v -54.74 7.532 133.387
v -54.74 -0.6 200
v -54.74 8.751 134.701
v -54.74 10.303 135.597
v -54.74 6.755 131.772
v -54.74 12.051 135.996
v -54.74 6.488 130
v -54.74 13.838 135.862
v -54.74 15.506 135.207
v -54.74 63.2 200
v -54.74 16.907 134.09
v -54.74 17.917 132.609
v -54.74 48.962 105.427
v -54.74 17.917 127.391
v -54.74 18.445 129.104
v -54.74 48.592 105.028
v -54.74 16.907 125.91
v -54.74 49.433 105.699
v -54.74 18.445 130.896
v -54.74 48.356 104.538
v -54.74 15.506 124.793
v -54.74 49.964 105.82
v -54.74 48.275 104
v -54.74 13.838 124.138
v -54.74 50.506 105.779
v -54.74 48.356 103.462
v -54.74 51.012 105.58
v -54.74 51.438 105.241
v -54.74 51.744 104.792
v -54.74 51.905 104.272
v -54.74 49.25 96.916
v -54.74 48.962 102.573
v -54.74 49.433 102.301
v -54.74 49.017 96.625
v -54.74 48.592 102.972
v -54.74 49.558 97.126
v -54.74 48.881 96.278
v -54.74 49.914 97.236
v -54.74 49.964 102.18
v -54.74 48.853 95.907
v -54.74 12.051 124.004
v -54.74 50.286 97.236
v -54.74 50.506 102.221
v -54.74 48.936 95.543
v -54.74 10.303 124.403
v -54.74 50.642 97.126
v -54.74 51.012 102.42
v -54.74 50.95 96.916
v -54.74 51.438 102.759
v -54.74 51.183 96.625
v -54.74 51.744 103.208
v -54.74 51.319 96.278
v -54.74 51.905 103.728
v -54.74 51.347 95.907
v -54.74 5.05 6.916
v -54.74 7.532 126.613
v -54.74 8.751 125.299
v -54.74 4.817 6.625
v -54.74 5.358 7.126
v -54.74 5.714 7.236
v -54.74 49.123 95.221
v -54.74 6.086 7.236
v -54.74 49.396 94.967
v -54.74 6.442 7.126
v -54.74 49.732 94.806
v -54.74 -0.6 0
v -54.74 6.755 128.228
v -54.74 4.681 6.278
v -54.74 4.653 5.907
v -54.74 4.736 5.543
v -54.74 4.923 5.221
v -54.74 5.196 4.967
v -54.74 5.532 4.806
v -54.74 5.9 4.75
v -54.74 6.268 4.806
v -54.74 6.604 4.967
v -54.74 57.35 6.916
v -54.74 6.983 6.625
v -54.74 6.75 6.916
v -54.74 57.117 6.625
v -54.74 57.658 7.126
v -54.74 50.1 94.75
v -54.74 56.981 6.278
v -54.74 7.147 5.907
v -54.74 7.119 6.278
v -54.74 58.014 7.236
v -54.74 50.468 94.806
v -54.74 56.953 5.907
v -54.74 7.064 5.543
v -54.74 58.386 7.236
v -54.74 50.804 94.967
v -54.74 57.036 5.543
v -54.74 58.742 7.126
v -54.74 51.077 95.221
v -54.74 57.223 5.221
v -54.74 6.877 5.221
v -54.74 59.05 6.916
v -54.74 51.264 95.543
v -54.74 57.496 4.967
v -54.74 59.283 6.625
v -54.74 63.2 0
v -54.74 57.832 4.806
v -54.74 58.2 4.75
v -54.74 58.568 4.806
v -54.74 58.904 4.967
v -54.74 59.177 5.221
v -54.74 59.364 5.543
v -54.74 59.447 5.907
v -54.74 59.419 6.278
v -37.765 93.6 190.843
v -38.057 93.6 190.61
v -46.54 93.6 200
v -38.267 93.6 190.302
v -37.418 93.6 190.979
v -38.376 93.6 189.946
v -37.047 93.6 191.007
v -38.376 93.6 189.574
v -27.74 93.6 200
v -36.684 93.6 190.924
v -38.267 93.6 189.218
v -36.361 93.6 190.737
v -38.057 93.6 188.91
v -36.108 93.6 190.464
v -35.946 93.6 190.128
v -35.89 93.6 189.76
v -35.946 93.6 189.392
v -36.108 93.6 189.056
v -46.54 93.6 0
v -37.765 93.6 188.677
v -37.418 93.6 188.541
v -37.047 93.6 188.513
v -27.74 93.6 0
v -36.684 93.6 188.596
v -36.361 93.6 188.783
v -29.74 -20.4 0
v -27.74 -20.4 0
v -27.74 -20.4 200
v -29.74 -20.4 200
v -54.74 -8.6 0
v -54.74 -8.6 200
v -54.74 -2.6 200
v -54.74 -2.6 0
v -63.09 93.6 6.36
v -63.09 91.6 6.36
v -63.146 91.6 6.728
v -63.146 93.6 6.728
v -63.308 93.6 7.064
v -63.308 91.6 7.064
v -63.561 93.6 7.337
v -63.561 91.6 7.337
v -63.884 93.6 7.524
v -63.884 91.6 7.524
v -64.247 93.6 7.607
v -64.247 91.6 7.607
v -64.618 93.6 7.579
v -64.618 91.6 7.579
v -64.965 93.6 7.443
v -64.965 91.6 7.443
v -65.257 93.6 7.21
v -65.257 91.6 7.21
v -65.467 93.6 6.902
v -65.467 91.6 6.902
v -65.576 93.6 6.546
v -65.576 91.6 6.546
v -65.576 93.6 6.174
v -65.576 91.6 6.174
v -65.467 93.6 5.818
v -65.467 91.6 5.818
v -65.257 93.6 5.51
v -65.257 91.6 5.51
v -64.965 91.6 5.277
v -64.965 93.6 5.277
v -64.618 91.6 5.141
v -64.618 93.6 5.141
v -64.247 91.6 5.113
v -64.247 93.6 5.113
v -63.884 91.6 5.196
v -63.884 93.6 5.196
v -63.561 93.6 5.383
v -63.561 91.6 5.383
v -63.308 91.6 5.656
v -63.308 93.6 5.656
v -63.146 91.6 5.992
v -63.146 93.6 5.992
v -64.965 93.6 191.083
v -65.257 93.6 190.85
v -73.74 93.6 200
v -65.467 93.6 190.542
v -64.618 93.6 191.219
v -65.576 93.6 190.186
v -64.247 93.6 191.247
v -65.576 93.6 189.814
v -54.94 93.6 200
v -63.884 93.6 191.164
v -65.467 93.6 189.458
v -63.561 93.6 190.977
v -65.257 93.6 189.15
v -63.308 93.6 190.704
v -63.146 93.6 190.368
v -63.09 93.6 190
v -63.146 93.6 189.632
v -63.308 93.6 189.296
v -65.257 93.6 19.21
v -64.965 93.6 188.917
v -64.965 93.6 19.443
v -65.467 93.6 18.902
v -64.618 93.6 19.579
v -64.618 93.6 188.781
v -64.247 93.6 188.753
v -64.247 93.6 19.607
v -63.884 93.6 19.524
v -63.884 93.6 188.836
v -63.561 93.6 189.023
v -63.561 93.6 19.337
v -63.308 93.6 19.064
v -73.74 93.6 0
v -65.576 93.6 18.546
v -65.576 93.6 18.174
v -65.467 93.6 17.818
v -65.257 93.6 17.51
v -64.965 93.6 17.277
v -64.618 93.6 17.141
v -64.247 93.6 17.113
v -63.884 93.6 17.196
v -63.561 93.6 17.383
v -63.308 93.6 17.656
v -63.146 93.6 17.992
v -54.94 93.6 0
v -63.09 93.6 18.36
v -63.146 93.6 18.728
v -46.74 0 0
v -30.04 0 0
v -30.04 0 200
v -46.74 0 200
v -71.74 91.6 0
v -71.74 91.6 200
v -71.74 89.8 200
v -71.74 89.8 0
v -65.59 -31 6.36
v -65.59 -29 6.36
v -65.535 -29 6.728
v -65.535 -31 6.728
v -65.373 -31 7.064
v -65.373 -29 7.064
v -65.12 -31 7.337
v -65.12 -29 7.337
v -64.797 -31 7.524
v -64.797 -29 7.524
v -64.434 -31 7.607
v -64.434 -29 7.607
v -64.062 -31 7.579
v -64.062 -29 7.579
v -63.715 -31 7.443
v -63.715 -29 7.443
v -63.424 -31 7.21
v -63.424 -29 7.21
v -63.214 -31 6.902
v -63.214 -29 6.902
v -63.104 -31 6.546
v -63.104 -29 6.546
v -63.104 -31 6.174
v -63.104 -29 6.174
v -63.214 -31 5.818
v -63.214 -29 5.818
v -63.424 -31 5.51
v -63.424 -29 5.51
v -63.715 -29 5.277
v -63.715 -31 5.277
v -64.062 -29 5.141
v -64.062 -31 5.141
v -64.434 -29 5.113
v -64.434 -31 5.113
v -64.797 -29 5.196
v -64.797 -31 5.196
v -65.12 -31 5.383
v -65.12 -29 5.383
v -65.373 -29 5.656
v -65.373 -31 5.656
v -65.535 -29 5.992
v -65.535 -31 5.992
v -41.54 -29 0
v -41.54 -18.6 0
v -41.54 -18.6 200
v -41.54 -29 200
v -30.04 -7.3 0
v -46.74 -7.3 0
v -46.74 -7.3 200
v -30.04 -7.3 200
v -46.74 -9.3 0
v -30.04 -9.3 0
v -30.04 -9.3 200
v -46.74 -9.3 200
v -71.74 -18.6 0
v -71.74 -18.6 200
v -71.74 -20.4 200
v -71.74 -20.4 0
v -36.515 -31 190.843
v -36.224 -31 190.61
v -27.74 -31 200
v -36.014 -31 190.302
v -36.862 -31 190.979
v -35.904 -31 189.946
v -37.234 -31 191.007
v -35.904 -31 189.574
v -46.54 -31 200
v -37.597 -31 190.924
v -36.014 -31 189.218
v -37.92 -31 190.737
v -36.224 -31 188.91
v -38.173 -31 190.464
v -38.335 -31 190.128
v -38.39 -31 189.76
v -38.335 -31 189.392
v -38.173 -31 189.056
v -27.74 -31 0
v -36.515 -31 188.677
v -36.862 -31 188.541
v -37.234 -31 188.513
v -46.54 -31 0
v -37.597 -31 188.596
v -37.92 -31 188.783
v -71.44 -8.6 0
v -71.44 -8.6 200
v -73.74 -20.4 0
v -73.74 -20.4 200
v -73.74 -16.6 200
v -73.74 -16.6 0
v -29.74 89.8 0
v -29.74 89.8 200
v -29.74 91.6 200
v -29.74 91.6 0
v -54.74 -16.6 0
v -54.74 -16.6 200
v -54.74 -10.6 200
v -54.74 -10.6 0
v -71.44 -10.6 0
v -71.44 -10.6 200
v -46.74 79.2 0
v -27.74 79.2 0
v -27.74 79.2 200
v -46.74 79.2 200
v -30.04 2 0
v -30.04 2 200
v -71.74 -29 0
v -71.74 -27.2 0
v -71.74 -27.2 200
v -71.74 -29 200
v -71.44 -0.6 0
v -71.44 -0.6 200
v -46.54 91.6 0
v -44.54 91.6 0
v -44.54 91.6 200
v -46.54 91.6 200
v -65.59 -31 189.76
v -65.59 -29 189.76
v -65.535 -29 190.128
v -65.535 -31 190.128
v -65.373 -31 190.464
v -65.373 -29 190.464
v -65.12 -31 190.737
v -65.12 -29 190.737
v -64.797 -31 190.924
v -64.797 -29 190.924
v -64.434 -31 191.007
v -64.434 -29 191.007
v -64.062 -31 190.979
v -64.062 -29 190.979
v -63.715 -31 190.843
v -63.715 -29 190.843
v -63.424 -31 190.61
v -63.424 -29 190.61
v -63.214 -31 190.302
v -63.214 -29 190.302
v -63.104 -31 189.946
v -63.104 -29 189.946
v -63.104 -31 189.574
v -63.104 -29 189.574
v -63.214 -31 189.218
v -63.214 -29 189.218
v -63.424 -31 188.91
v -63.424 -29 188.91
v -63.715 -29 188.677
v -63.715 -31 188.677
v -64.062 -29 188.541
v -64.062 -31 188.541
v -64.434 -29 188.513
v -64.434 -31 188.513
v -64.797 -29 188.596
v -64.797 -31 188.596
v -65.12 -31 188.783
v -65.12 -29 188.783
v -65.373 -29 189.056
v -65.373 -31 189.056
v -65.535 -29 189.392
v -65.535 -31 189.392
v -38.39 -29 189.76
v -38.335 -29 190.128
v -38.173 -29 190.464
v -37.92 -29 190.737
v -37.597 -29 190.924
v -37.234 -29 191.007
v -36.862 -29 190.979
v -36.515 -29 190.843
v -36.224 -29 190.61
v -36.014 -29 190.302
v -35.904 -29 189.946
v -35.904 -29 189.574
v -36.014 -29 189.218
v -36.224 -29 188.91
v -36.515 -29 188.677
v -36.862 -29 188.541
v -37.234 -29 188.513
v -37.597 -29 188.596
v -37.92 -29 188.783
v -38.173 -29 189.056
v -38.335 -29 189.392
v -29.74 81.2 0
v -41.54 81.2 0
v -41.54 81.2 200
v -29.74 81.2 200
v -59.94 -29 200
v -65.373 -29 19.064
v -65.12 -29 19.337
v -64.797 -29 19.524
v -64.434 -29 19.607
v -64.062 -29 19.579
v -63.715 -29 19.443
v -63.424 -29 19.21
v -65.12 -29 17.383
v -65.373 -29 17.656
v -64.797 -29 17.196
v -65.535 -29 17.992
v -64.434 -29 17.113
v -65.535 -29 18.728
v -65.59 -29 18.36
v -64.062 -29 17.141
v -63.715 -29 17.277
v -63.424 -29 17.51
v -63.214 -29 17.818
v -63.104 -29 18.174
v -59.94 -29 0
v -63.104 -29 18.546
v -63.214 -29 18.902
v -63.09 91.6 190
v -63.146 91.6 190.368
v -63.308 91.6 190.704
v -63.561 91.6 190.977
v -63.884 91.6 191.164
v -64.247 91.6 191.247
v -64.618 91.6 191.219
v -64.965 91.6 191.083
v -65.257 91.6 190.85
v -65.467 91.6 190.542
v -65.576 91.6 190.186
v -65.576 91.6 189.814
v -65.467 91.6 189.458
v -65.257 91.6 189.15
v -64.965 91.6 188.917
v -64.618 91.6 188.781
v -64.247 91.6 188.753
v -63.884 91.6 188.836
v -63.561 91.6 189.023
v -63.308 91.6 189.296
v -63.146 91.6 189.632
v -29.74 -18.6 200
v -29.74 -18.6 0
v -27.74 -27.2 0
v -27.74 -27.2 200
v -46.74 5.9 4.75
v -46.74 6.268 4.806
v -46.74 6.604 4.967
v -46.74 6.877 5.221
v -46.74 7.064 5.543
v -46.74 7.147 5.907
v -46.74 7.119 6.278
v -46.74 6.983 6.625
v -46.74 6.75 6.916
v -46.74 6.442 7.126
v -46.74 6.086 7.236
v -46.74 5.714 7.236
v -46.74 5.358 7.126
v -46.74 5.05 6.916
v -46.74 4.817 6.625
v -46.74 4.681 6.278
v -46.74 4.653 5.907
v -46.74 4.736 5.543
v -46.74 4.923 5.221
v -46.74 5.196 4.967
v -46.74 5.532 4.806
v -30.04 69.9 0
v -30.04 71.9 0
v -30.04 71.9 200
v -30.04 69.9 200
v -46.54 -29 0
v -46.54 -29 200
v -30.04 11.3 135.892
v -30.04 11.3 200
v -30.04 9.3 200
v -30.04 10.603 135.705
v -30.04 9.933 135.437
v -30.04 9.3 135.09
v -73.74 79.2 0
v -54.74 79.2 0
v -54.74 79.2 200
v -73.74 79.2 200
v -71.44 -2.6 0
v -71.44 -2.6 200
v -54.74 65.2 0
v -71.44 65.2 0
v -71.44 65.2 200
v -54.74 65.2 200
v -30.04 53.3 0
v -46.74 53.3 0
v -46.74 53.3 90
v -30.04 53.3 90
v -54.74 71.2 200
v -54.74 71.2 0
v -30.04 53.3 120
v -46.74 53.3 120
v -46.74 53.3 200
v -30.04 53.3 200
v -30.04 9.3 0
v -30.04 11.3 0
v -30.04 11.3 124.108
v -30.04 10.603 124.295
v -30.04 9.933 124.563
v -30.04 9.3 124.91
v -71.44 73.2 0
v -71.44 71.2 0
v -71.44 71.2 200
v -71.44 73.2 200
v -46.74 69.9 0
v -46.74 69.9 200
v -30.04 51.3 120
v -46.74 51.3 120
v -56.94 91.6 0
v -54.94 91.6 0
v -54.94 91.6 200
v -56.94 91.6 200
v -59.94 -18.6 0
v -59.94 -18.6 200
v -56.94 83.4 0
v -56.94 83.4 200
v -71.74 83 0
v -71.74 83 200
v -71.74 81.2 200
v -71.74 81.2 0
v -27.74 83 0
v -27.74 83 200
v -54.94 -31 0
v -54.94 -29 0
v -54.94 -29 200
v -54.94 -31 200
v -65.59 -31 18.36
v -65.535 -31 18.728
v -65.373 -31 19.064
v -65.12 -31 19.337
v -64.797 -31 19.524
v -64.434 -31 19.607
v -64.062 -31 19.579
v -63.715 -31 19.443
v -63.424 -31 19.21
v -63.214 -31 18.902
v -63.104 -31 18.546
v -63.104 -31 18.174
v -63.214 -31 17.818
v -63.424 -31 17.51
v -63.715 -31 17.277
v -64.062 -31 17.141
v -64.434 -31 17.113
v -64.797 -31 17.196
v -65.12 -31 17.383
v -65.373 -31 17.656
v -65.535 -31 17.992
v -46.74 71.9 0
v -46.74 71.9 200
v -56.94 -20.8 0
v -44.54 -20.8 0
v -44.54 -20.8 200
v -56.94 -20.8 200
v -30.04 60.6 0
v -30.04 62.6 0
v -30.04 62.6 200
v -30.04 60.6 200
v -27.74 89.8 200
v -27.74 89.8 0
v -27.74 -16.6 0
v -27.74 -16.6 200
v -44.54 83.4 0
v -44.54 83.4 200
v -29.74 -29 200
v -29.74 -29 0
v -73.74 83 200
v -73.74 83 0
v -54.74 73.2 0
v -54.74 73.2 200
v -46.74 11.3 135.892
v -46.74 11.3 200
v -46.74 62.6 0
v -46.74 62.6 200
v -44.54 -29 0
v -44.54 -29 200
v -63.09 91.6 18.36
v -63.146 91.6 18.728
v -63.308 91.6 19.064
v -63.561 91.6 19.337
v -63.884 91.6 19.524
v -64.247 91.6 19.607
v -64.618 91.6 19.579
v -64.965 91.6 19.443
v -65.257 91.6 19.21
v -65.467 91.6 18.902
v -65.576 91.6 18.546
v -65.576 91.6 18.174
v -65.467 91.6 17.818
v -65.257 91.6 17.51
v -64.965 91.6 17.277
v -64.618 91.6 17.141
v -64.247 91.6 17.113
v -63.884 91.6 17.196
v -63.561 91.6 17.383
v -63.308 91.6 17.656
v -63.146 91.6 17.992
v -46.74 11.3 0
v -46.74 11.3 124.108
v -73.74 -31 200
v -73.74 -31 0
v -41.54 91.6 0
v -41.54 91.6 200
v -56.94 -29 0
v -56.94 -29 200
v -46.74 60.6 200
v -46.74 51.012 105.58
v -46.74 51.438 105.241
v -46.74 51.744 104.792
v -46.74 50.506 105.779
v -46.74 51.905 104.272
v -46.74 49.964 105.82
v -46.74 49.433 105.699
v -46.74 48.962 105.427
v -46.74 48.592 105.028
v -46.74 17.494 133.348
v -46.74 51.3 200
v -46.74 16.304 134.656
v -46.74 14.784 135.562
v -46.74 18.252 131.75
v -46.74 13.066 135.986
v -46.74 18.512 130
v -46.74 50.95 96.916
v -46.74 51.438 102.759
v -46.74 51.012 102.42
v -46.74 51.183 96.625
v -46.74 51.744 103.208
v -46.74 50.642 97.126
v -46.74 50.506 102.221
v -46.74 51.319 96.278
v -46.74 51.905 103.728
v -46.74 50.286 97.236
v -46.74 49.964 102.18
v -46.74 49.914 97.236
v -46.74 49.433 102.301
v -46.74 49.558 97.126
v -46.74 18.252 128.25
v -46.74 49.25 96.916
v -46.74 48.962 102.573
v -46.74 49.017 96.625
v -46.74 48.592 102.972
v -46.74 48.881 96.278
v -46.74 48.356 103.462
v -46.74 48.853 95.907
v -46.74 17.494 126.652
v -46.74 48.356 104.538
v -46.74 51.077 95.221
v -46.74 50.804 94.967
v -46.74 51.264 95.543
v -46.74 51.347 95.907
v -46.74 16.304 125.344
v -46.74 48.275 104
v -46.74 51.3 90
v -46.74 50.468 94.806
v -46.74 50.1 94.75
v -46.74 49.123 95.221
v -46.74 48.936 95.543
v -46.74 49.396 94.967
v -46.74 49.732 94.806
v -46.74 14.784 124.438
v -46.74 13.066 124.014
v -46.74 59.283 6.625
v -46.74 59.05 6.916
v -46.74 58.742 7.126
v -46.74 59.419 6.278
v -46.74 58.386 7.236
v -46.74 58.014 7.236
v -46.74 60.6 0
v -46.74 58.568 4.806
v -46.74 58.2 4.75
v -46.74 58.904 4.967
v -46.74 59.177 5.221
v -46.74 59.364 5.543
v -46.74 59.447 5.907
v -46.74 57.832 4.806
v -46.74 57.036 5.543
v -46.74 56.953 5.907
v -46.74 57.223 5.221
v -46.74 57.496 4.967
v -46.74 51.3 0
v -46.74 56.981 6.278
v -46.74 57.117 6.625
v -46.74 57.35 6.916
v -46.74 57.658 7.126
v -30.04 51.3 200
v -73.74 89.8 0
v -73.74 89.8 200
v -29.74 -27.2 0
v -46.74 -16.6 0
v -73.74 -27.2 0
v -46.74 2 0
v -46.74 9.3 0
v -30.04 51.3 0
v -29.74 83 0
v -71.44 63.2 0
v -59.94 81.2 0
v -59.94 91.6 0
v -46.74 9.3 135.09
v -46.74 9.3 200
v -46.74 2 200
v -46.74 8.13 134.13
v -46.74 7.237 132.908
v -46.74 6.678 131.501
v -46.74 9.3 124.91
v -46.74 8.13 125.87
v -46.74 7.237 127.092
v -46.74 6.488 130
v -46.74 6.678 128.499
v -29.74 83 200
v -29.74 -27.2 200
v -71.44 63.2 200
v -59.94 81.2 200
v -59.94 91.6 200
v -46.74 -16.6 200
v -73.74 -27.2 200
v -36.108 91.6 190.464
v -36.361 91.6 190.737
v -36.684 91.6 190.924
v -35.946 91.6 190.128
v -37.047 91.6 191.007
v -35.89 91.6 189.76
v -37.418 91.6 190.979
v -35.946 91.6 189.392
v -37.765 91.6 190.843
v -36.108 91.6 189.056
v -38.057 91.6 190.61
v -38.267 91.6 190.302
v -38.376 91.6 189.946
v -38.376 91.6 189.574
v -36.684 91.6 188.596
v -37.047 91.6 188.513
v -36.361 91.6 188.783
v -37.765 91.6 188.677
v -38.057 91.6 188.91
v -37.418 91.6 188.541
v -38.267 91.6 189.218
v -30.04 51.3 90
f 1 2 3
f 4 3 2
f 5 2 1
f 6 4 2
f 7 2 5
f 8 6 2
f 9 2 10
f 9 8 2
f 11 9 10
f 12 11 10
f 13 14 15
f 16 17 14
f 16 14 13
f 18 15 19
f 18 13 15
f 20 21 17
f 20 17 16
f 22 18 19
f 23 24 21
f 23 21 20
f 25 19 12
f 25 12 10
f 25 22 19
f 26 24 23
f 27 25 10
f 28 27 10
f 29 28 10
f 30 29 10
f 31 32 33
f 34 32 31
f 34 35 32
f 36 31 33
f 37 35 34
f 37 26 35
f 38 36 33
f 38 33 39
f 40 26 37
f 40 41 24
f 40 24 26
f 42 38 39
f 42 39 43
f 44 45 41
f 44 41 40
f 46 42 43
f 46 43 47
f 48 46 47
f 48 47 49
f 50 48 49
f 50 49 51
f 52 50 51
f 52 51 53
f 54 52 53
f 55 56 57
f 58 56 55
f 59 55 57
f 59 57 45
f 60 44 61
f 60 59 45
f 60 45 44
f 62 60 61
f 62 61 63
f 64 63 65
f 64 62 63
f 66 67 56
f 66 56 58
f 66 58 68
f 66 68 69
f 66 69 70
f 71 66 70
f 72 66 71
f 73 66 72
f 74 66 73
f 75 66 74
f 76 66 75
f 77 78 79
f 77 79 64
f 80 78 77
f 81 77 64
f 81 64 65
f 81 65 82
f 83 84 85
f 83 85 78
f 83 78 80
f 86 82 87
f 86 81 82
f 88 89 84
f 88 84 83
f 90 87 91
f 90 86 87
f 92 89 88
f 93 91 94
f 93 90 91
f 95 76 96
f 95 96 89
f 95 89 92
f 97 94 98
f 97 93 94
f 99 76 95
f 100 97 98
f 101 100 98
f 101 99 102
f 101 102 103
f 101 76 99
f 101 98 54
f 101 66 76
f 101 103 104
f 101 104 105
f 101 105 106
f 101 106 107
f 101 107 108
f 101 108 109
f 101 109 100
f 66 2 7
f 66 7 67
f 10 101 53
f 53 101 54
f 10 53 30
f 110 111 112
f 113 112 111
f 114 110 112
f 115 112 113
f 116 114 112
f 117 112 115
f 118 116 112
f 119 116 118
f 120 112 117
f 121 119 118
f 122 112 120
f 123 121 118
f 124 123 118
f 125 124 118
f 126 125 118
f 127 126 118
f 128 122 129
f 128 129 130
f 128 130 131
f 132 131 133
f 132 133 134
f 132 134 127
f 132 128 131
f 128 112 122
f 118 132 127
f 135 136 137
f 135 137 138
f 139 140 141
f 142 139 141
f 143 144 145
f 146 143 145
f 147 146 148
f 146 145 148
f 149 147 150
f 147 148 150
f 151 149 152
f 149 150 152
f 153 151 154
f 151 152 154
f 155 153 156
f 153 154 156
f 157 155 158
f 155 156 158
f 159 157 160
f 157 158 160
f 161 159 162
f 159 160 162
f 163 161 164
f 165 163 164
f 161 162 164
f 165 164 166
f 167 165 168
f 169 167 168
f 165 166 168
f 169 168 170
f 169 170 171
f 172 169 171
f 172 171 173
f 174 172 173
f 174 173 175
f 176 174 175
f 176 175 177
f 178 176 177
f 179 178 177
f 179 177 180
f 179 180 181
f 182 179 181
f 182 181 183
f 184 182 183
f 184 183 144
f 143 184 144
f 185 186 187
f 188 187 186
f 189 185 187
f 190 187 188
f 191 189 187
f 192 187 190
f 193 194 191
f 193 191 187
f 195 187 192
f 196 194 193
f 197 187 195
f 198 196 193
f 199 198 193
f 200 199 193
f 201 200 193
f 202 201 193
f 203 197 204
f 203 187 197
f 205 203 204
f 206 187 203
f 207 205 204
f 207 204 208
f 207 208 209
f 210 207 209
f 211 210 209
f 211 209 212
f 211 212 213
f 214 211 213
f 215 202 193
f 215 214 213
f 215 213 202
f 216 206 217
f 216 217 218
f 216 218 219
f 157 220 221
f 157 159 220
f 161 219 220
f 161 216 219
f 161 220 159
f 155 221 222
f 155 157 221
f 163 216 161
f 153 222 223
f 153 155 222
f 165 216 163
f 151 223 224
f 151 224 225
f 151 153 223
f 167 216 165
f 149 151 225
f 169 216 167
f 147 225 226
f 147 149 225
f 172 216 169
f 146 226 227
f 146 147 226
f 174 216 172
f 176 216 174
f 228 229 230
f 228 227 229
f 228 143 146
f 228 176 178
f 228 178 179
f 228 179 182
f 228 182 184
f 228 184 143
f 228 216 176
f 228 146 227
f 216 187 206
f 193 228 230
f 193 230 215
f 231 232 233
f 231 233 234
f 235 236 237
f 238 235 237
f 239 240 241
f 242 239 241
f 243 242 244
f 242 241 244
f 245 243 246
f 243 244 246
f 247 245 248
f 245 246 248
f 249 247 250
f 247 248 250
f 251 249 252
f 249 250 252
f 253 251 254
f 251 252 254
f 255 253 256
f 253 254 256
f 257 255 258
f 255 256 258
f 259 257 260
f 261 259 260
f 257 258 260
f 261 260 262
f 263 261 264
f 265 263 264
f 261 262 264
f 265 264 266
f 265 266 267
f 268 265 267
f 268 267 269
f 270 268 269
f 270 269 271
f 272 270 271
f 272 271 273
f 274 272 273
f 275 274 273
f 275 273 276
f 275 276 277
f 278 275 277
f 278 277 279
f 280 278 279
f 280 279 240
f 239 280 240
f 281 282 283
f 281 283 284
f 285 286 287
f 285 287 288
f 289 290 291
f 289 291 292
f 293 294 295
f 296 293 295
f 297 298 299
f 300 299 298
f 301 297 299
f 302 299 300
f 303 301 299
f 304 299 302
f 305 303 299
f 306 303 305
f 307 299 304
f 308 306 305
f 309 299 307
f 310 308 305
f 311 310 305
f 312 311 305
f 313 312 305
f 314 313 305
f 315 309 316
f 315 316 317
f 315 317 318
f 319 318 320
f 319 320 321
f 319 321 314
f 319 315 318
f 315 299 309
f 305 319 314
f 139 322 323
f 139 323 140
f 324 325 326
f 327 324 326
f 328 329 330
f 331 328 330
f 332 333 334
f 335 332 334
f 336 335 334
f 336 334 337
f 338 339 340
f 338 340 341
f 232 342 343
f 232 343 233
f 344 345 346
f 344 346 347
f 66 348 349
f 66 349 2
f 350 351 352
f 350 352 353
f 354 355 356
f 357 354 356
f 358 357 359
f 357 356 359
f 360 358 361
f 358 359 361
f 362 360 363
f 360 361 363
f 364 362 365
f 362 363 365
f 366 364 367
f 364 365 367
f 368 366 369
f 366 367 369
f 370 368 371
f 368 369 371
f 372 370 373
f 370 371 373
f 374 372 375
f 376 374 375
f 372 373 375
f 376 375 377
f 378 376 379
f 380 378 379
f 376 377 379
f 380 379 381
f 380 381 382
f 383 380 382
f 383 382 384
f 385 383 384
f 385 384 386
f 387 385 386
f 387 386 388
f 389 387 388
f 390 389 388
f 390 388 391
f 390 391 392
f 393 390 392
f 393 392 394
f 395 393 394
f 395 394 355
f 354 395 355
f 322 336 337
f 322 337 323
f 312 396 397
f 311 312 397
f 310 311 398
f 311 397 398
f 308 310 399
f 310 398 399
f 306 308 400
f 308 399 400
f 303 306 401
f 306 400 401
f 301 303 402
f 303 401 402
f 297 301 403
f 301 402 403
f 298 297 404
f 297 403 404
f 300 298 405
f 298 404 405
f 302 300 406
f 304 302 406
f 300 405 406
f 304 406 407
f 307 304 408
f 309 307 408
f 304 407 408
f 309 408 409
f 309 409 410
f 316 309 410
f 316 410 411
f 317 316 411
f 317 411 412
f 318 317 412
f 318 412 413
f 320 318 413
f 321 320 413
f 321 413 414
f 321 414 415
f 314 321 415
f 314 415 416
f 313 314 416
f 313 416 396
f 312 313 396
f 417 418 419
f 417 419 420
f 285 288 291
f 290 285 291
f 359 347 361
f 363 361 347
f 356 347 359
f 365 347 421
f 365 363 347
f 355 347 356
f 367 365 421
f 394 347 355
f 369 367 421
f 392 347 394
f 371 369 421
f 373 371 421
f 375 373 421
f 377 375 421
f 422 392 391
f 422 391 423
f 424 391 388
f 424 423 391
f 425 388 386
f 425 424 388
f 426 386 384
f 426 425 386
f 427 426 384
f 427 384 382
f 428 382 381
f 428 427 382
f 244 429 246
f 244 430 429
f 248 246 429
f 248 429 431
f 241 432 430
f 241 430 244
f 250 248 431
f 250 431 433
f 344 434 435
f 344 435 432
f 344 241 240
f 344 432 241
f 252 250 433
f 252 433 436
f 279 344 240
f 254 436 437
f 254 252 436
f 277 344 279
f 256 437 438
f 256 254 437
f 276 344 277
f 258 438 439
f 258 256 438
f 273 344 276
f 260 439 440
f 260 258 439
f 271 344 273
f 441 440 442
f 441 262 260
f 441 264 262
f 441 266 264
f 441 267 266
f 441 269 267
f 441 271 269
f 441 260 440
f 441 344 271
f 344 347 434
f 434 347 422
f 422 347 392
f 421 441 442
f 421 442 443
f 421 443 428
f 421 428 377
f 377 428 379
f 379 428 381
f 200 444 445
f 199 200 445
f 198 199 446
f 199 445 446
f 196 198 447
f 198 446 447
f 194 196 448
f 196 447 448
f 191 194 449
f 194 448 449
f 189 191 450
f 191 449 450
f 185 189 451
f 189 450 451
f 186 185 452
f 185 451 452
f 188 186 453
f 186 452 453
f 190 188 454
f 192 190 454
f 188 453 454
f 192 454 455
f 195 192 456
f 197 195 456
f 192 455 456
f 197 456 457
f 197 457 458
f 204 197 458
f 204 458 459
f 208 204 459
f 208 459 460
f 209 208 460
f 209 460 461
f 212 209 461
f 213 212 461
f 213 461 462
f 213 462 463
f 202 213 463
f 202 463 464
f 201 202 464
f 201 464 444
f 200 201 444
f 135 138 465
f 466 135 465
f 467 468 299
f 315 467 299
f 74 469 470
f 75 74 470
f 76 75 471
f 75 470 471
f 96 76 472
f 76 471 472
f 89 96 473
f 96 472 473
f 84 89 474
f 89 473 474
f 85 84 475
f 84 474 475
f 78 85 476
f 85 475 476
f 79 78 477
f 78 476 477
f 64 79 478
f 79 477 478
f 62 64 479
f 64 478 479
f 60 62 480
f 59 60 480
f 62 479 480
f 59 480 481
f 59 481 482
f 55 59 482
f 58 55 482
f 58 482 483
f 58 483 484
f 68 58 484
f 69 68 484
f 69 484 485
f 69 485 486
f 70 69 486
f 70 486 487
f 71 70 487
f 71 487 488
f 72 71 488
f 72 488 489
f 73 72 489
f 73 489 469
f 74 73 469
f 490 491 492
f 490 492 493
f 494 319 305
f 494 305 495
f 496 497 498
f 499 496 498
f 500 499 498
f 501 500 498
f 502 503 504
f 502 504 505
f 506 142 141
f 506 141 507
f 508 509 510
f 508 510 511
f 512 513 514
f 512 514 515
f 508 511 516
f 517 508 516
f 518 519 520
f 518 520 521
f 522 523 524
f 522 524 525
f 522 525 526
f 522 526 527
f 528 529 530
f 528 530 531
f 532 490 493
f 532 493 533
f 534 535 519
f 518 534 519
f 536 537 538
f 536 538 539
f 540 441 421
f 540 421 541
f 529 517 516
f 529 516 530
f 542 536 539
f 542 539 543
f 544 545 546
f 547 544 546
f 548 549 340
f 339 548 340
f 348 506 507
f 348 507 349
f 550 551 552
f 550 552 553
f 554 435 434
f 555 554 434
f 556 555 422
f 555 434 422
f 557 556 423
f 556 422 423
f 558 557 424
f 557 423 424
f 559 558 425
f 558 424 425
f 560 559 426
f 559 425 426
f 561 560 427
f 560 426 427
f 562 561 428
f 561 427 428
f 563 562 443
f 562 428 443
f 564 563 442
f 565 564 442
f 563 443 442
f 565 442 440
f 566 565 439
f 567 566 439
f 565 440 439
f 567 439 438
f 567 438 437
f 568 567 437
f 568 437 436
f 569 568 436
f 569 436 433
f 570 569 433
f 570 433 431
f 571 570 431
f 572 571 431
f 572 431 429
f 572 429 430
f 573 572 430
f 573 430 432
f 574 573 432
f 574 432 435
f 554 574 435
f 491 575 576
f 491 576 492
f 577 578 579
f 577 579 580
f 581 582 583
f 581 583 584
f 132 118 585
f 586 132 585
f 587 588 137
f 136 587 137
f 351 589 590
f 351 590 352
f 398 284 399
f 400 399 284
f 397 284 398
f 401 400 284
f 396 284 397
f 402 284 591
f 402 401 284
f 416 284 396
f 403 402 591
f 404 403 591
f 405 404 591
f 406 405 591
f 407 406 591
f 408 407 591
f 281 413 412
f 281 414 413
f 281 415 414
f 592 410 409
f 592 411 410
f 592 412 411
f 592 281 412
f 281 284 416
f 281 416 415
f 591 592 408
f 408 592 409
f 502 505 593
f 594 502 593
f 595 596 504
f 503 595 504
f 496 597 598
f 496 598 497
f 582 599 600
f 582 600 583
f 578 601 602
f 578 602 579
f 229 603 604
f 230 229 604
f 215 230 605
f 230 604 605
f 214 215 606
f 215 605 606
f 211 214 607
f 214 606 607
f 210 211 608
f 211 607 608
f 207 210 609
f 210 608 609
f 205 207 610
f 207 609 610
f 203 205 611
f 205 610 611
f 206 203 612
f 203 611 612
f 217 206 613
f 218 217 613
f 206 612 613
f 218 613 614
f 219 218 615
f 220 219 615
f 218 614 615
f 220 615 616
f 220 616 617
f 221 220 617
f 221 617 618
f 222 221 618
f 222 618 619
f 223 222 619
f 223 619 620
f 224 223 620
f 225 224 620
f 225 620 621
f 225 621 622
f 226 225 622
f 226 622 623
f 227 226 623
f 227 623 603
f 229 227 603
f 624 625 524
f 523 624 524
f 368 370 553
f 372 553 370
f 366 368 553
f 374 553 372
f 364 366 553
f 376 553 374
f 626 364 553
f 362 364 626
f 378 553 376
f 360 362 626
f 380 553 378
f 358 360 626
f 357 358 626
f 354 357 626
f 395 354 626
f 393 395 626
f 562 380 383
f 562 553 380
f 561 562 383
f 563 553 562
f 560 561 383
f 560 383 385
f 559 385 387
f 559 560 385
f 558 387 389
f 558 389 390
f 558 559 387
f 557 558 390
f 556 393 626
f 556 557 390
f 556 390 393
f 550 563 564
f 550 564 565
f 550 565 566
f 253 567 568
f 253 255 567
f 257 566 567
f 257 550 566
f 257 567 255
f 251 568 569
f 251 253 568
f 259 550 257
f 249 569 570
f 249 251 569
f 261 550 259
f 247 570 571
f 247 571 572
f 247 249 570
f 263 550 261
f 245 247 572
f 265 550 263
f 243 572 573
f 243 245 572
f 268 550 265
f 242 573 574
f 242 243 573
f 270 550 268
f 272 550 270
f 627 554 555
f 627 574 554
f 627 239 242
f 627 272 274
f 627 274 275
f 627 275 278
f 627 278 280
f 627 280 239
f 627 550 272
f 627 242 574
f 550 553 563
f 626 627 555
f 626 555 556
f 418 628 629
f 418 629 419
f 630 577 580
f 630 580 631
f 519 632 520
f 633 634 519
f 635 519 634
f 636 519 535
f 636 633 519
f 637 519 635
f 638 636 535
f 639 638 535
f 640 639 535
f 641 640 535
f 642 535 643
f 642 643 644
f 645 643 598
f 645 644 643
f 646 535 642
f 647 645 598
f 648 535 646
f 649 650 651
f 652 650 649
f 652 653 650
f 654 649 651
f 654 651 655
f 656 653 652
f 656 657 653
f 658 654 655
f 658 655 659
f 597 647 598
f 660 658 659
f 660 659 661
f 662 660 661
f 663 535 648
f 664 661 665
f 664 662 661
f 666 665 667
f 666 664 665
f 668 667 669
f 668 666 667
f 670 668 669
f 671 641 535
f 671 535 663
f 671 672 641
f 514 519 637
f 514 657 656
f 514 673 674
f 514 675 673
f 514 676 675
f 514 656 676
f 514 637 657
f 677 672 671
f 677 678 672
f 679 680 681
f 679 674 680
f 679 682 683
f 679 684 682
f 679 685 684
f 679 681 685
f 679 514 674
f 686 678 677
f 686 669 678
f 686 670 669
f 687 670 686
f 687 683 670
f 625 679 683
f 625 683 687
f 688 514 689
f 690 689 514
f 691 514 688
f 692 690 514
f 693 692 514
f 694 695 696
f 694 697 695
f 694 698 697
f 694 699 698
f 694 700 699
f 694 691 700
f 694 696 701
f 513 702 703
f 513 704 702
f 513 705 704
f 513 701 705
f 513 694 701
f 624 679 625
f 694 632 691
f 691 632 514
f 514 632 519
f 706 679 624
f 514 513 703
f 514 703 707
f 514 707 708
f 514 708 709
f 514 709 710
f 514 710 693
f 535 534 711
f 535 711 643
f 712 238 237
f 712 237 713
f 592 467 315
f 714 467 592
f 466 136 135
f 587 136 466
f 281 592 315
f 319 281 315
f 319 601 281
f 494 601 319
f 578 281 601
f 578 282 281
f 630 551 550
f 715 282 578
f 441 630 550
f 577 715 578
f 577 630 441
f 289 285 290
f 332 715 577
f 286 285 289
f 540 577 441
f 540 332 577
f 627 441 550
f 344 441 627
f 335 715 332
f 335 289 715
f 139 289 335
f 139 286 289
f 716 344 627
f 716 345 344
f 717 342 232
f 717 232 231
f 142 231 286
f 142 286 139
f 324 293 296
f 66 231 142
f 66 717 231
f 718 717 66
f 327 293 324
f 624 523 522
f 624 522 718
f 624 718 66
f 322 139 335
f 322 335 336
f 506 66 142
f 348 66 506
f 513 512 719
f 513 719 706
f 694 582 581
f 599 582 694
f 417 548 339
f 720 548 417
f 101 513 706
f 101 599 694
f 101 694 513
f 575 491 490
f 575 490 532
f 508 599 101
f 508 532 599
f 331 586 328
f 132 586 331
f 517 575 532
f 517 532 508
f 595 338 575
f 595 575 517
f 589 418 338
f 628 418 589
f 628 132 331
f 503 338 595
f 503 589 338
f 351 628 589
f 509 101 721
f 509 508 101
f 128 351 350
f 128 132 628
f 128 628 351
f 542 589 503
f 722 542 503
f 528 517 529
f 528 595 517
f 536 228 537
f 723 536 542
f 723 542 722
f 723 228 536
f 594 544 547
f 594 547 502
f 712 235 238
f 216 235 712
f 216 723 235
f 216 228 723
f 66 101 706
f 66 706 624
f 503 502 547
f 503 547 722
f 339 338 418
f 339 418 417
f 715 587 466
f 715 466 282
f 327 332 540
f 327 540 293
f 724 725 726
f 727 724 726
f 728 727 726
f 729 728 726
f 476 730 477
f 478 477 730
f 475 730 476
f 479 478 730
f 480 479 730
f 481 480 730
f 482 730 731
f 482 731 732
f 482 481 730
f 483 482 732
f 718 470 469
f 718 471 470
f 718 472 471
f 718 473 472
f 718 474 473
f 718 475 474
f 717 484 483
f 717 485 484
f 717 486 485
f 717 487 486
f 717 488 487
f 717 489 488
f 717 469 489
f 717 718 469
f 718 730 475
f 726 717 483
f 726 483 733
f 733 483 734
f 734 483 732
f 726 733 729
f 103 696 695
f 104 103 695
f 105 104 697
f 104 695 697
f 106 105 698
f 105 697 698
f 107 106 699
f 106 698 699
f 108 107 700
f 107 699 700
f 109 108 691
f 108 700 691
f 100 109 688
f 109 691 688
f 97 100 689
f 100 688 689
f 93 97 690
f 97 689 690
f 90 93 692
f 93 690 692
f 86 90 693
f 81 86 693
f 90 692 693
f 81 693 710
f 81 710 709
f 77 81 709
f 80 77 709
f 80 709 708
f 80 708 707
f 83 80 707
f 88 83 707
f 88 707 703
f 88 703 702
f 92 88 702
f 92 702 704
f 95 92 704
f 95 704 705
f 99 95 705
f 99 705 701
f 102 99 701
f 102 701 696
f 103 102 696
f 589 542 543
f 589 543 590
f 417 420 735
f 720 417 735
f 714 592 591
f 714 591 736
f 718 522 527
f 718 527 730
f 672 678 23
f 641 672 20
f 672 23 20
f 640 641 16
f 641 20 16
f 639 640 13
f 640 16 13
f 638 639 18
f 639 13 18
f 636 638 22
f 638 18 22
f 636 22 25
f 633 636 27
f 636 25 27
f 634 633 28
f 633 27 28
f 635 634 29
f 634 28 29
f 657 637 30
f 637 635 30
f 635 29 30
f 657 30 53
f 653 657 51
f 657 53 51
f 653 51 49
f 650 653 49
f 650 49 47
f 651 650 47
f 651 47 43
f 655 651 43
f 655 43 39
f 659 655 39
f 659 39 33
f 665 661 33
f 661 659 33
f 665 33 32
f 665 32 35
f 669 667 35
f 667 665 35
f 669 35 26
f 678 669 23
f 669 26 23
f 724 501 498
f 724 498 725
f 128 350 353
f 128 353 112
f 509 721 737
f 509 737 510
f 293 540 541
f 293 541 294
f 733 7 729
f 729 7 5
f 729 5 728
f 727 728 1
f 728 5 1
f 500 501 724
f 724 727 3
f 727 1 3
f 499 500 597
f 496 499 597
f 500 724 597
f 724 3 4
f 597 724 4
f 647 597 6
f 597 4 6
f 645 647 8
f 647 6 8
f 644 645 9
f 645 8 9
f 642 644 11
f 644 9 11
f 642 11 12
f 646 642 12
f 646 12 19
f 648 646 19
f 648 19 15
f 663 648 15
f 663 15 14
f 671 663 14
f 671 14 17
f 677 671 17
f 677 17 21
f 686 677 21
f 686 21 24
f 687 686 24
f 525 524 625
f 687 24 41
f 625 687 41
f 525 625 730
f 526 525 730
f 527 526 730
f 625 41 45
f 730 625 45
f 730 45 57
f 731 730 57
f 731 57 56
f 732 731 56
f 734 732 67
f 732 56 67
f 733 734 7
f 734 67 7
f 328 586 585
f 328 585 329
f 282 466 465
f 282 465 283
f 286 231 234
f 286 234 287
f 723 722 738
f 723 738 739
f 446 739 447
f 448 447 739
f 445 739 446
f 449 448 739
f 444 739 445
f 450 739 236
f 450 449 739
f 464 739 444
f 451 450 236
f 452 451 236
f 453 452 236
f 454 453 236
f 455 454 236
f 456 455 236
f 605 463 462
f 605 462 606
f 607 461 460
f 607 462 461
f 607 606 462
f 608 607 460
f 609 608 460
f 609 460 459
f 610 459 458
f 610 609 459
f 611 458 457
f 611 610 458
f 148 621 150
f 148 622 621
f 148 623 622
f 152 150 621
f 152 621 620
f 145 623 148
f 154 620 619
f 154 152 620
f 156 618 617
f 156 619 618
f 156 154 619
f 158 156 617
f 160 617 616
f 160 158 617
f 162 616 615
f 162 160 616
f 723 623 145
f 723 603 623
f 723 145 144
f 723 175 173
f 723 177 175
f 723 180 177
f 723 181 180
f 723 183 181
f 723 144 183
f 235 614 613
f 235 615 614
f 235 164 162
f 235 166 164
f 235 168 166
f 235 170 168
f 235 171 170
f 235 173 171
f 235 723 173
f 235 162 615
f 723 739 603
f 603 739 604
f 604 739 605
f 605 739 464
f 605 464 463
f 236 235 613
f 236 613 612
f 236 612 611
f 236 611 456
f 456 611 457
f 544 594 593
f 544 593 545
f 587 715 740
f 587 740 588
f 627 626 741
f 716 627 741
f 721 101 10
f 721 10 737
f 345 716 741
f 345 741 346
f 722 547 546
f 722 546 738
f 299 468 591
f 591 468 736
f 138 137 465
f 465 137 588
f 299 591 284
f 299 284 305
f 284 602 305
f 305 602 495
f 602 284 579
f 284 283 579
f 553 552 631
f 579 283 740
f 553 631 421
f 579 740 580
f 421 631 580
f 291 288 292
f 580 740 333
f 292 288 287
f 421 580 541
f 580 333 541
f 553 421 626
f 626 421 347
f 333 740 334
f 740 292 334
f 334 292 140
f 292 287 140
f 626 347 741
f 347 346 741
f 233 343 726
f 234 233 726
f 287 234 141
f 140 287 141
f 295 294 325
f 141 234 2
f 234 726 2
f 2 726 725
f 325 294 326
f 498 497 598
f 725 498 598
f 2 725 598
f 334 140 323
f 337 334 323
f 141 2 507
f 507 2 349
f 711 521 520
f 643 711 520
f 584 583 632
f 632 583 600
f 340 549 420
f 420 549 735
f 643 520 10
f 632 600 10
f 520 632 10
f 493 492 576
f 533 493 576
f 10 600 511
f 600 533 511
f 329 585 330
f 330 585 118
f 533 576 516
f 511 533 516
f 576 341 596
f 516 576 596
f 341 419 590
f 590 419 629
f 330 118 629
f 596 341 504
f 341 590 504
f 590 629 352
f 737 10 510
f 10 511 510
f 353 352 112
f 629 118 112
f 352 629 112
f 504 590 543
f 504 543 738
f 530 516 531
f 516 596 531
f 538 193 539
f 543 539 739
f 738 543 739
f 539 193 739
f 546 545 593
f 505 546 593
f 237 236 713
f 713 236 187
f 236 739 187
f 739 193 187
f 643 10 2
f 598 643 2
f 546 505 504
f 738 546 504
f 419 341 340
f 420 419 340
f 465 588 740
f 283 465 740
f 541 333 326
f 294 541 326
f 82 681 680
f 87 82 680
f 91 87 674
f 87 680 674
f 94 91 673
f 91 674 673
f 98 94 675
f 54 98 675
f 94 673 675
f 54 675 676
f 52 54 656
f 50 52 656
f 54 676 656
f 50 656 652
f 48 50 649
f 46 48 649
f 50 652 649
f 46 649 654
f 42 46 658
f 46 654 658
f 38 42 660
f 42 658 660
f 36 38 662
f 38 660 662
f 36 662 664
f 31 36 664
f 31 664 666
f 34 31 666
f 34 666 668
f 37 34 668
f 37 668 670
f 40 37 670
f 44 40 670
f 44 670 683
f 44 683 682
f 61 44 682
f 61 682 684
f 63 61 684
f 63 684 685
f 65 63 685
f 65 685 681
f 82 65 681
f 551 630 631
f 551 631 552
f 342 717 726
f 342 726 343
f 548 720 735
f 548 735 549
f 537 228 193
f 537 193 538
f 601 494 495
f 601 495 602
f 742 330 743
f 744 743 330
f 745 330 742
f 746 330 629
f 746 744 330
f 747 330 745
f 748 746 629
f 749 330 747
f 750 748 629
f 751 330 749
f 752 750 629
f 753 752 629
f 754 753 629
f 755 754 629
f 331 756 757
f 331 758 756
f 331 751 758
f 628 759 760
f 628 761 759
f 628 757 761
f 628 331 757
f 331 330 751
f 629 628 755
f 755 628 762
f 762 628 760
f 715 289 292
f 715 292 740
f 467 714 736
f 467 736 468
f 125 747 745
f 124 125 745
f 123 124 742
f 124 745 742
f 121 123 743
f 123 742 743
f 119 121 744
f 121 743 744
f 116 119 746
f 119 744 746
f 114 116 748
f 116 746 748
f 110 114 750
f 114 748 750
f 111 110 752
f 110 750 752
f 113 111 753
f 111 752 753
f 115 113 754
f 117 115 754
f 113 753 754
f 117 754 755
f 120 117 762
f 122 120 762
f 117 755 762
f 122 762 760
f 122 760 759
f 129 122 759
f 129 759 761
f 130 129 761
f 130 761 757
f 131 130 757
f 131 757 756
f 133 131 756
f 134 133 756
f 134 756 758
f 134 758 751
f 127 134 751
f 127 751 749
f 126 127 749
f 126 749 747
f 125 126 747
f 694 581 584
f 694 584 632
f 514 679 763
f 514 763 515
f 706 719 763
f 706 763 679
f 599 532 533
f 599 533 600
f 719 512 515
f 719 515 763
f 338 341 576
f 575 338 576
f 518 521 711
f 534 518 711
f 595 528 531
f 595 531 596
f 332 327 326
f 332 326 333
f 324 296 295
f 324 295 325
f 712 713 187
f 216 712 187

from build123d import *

# Parameters (mm, degrees)
RESSALTO_EXTRUS_O1_DEPTH                     = 200
CORTE_EXTRUS_O3_REACH                        = 224.463
ESBO_O4_R                                    = 1.825
CORTE_EXTRUS_O5_REACH                        = 224.463
ESBO_O6_R                                    = 6.0125
BROCA_DE_ROSQUEAR_PARA_TARRAXA_DE_M3X0_5_D   = 2.5
BROCA_DE_ROSQUEAR_PARA_TARRAXA_DE_M3_2_D     = 2.5
BROCA_DE_ROSQUEAR_PARA_TARRAXA_DE_M3_2_DEPTH = 8
BROCA_DE_ROSQUEAR_PARA_TARRAXA_DE_M3_3_D     = 2.5
BROCA_DE_ROSQUEAR_PARA_TARRAXA_DE_M3_3_DEPTH = 2
BROCA_DE_ROSQUEAR_PARA_TARRAXA_DE_M3_4_D     = 2.5
BROCA_DE_ROSQUEAR_PARA_TARRAXA_DE_M3_4_DEPTH = 2
BROCA_DE_ROSQUEAR_PARA_TARRAXA_DE_M3_5_D     = 2.5
BROCA_DE_ROSQUEAR_PARA_TARRAXA_DE_M3_5_DEPTH = 2
CORTE_EXTRUS_O6_START                        = -16.7
ESBO_O26_W                                   = 30
ESBO_O26_H                                   = 2
CORTE_EXTRUS_O6_DEPTH                        = 16.7
BROCA_DE_ROSQUEAR_PARA_TARRAXA_DE_M3_6_D     = 2.5
BROCA_DE_ROSQUEAR_PARA_TARRAXA_DE_M3_6_DEPTH = 2


with BuildPart() as part:
    # Esboço1 → Ressalto-extrusão1 (new body)
    with BuildSketch(Plane.XY):
        Polygon((-54.740307174, -0.6), (-54.740307174, 63.2), (-71.440307174, 63.2), (-71.440307174, 65.2), (-54.740307174, 65.2), (-54.740307174, 71.2), (-71.440307174, 71.2), (-71.440307174, 73.2), (-54.740307174, 73.2), (-54.740307174, 79.2), (-73.740307174, 79.2), (-73.740307174, 83), (-71.740307174, 83), (-71.740307174, 81.2), (-59.940307174, 81.2), (-59.940307174, 91.6), (-71.740307174, 91.6), (-71.740307174, 89.8), (-73.740307174, 89.8), (-73.740307174, 93.6), (-54.940307174, 93.6), (-54.940307174, 91.6), (-56.940307174, 91.6), (-56.940307174, 83.4), (-44.540307174, 83.4), (-44.540307174, 91.6), (-46.540307174, 91.6), (-46.540307174, 93.6), (-27.740307174, 93.6), (-27.740307174, 89.8), (-29.740307174, 89.8), (-29.740307174, 91.6), (-41.540307174, 91.6), (-41.540307174, 81.2), (-29.740307174, 81.2), (-29.740307174, 83), (-27.740307174, 83), (-27.740307174, 79.2), (-46.740307174, 79.2), (-46.740307174, 71.9), (-30.040307174, 71.9), (-30.040307174, 69.9), (-46.740307174, 69.9), (-46.740307174, 62.6), (-30.040307174, 62.6), (-30.040307174, 60.6), (-46.740307174, 60.6), (-46.740307174, 53.3), (-30.040307174, 53.3), (-30.040307174, 51.3), (-46.740307174, 51.3), (-46.740307174, 11.3), (-30.040307174, 11.3), (-30.040307174, 9.3), (-46.740307174, 9.3), (-46.740307174, 2), (-30.040307174, 2), (-30.040307174, 0), (-46.740307174, 0), (-46.740307174, -7.3), (-30.040307174, -7.3), (-30.040307174, -9.3), (-46.740307174, -9.3), (-46.740307174, -16.6), (-27.740307174, -16.6), (-27.740307174, -20.4), (-29.740307174, -20.4), (-29.740307174, -18.6), (-41.540307174, -18.6), (-41.540307174, -29), (-29.740307174, -29), (-29.740307174, -27.2), (-27.740307174, -27.2), (-27.740307174, -31), (-46.540307174, -31), (-46.540307174, -29), (-44.540307174, -29), (-44.540307174, -20.8), (-56.940307174, -20.8), (-56.940307174, -29), (-54.940307174, -29), (-54.940307174, -31), (-73.740307174, -31), (-73.740307174, -27.2), (-71.740307174, -27.2), (-71.740307174, -29), (-59.940307174, -29), (-59.940307174, -18.6), (-71.740307174, -18.6), (-71.740307174, -20.4), (-73.740307174, -20.4), (-73.740307174, -16.6), (-54.740307174, -16.6), (-54.740307174, -10.6), (-71.440307174, -10.6), (-71.440307174, -8.6), (-54.740307174, -8.6), (-54.740307174, -2.6), (-71.440307174, -2.6), (-71.440307174, -0.6), align=None)
    extrude(amount=RESSALTO_EXTRUS_O1_DEPTH)

    # Esboço4 → Corte-extrusão3 (cut, up to next)
    with BuildSketch(Plane.ZY.offset(54.740307174), mode=Mode.PRIVATE) as corte_extrus_o3_sk1:
        with Locations(Location((104, 50.1, 0), (0, 0, 270))):
            Circle(ESBO_O4_R)
    corte_extrus_o3_tool1 = extrude(corte_extrus_o3_sk1.sketch, amount=-CORTE_EXTRUS_O3_REACH, mode=Mode.PRIVATE) & part.part
    add(corte_extrus_o3_tool1.solids().sort_by_distance((-54.740307, 50.1, 104))[0], mode=Mode.SUBTRACT)

    # Esboço6 → Corte-extrusão5 (cut, up to next)
    with BuildSketch(Plane.ZY.offset(54.740307174), mode=Mode.PRIVATE) as corte_extrus_o5_sk1:
        with Locations(Location((130, 12.5, 0), (0, 0, 270))):
            Circle(ESBO_O6_R)
    corte_extrus_o5_tool1 = extrude(corte_extrus_o5_sk1.sketch, amount=-CORTE_EXTRUS_O5_REACH, mode=Mode.PRIVATE) & part.part
    add(corte_extrus_o5_tool1.solids().sort_by_distance((-54.740307, 12.5, 130))[0], mode=Mode.SUBTRACT)

    # Broca de rosquear para tarraxa de M3x0.5 (through all)
    with Locations(Plane.ZY.offset(54.740307174)):
        with Locations((6, 5.9), (6, 58.2)):
            Hole(BROCA_DE_ROSQUEAR_PARA_TARRAXA_DE_M3X0_5_D / 2)

    # Broca de rosquear para tarraxa de M3 2
    with Locations(Plane.ZY.offset(54.740307174)):
        with Locations((96, 50.1)):
            Hole(BROCA_DE_ROSQUEAR_PARA_TARRAXA_DE_M3_2_D / 2, depth=BROCA_DE_ROSQUEAR_PARA_TARRAXA_DE_M3_2_DEPTH)

    # Broca de rosquear para tarraxa de M3 3
    with Locations(Plane(origin=(0, 93.6, 0), x_dir=(-1, 0, 0), z_dir=(0, 1, 0))):
        with Locations((64.340307174, 190), (37.140307174, 189.76)):
            Hole(BROCA_DE_ROSQUEAR_PARA_TARRAXA_DE_M3_3_D / 2, depth=BROCA_DE_ROSQUEAR_PARA_TARRAXA_DE_M3_3_DEPTH)

    # Broca de rosquear para tarraxa de M3 4
    with Locations(Plane(origin=(0, 93.6, 0), x_dir=(-1, 0, 0), z_dir=(0, 1, 0))):
        with Locations((64.340307174, 18.36), (64.340307174, 6.36)):
            Hole(BROCA_DE_ROSQUEAR_PARA_TARRAXA_DE_M3_4_D / 2, depth=BROCA_DE_ROSQUEAR_PARA_TARRAXA_DE_M3_4_DEPTH)

    # Broca de rosquear para tarraxa de M3 5
    with Locations(Plane.XZ.offset(31)):
        with Locations((-64.340307174, 18.36), (-64.340307174, 6.36)):
            Hole(BROCA_DE_ROSQUEAR_PARA_TARRAXA_DE_M3_5_D / 2, depth=BROCA_DE_ROSQUEAR_PARA_TARRAXA_DE_M3_5_DEPTH)

    # Esboço26 → Corte-extrusão6 (cut)
    with BuildSketch(Plane(origin=(-30.040307174, 0, 0), x_dir=(0, 0, -1), z_dir=(1, 0, 0)).offset(CORTE_EXTRUS_O6_START)):
        with Locations((-105, 52.3)):
            Rectangle(ESBO_O26_W, ESBO_O26_H)
    extrude(amount=CORTE_EXTRUS_O6_DEPTH, mode=Mode.SUBTRACT)

    # Broca de rosquear para tarraxa de M3 6
    with Locations(Plane.XZ.offset(31)):
        with Locations((-64.340307174, 189.76), (-37.140307174, 189.76)):
            Hole(BROCA_DE_ROSQUEAR_PARA_TARRAXA_DE_M3_6_D / 2, depth=BROCA_DE_ROSQUEAR_PARA_TARRAXA_DE_M3_6_DEPTH)


solid = part.part
